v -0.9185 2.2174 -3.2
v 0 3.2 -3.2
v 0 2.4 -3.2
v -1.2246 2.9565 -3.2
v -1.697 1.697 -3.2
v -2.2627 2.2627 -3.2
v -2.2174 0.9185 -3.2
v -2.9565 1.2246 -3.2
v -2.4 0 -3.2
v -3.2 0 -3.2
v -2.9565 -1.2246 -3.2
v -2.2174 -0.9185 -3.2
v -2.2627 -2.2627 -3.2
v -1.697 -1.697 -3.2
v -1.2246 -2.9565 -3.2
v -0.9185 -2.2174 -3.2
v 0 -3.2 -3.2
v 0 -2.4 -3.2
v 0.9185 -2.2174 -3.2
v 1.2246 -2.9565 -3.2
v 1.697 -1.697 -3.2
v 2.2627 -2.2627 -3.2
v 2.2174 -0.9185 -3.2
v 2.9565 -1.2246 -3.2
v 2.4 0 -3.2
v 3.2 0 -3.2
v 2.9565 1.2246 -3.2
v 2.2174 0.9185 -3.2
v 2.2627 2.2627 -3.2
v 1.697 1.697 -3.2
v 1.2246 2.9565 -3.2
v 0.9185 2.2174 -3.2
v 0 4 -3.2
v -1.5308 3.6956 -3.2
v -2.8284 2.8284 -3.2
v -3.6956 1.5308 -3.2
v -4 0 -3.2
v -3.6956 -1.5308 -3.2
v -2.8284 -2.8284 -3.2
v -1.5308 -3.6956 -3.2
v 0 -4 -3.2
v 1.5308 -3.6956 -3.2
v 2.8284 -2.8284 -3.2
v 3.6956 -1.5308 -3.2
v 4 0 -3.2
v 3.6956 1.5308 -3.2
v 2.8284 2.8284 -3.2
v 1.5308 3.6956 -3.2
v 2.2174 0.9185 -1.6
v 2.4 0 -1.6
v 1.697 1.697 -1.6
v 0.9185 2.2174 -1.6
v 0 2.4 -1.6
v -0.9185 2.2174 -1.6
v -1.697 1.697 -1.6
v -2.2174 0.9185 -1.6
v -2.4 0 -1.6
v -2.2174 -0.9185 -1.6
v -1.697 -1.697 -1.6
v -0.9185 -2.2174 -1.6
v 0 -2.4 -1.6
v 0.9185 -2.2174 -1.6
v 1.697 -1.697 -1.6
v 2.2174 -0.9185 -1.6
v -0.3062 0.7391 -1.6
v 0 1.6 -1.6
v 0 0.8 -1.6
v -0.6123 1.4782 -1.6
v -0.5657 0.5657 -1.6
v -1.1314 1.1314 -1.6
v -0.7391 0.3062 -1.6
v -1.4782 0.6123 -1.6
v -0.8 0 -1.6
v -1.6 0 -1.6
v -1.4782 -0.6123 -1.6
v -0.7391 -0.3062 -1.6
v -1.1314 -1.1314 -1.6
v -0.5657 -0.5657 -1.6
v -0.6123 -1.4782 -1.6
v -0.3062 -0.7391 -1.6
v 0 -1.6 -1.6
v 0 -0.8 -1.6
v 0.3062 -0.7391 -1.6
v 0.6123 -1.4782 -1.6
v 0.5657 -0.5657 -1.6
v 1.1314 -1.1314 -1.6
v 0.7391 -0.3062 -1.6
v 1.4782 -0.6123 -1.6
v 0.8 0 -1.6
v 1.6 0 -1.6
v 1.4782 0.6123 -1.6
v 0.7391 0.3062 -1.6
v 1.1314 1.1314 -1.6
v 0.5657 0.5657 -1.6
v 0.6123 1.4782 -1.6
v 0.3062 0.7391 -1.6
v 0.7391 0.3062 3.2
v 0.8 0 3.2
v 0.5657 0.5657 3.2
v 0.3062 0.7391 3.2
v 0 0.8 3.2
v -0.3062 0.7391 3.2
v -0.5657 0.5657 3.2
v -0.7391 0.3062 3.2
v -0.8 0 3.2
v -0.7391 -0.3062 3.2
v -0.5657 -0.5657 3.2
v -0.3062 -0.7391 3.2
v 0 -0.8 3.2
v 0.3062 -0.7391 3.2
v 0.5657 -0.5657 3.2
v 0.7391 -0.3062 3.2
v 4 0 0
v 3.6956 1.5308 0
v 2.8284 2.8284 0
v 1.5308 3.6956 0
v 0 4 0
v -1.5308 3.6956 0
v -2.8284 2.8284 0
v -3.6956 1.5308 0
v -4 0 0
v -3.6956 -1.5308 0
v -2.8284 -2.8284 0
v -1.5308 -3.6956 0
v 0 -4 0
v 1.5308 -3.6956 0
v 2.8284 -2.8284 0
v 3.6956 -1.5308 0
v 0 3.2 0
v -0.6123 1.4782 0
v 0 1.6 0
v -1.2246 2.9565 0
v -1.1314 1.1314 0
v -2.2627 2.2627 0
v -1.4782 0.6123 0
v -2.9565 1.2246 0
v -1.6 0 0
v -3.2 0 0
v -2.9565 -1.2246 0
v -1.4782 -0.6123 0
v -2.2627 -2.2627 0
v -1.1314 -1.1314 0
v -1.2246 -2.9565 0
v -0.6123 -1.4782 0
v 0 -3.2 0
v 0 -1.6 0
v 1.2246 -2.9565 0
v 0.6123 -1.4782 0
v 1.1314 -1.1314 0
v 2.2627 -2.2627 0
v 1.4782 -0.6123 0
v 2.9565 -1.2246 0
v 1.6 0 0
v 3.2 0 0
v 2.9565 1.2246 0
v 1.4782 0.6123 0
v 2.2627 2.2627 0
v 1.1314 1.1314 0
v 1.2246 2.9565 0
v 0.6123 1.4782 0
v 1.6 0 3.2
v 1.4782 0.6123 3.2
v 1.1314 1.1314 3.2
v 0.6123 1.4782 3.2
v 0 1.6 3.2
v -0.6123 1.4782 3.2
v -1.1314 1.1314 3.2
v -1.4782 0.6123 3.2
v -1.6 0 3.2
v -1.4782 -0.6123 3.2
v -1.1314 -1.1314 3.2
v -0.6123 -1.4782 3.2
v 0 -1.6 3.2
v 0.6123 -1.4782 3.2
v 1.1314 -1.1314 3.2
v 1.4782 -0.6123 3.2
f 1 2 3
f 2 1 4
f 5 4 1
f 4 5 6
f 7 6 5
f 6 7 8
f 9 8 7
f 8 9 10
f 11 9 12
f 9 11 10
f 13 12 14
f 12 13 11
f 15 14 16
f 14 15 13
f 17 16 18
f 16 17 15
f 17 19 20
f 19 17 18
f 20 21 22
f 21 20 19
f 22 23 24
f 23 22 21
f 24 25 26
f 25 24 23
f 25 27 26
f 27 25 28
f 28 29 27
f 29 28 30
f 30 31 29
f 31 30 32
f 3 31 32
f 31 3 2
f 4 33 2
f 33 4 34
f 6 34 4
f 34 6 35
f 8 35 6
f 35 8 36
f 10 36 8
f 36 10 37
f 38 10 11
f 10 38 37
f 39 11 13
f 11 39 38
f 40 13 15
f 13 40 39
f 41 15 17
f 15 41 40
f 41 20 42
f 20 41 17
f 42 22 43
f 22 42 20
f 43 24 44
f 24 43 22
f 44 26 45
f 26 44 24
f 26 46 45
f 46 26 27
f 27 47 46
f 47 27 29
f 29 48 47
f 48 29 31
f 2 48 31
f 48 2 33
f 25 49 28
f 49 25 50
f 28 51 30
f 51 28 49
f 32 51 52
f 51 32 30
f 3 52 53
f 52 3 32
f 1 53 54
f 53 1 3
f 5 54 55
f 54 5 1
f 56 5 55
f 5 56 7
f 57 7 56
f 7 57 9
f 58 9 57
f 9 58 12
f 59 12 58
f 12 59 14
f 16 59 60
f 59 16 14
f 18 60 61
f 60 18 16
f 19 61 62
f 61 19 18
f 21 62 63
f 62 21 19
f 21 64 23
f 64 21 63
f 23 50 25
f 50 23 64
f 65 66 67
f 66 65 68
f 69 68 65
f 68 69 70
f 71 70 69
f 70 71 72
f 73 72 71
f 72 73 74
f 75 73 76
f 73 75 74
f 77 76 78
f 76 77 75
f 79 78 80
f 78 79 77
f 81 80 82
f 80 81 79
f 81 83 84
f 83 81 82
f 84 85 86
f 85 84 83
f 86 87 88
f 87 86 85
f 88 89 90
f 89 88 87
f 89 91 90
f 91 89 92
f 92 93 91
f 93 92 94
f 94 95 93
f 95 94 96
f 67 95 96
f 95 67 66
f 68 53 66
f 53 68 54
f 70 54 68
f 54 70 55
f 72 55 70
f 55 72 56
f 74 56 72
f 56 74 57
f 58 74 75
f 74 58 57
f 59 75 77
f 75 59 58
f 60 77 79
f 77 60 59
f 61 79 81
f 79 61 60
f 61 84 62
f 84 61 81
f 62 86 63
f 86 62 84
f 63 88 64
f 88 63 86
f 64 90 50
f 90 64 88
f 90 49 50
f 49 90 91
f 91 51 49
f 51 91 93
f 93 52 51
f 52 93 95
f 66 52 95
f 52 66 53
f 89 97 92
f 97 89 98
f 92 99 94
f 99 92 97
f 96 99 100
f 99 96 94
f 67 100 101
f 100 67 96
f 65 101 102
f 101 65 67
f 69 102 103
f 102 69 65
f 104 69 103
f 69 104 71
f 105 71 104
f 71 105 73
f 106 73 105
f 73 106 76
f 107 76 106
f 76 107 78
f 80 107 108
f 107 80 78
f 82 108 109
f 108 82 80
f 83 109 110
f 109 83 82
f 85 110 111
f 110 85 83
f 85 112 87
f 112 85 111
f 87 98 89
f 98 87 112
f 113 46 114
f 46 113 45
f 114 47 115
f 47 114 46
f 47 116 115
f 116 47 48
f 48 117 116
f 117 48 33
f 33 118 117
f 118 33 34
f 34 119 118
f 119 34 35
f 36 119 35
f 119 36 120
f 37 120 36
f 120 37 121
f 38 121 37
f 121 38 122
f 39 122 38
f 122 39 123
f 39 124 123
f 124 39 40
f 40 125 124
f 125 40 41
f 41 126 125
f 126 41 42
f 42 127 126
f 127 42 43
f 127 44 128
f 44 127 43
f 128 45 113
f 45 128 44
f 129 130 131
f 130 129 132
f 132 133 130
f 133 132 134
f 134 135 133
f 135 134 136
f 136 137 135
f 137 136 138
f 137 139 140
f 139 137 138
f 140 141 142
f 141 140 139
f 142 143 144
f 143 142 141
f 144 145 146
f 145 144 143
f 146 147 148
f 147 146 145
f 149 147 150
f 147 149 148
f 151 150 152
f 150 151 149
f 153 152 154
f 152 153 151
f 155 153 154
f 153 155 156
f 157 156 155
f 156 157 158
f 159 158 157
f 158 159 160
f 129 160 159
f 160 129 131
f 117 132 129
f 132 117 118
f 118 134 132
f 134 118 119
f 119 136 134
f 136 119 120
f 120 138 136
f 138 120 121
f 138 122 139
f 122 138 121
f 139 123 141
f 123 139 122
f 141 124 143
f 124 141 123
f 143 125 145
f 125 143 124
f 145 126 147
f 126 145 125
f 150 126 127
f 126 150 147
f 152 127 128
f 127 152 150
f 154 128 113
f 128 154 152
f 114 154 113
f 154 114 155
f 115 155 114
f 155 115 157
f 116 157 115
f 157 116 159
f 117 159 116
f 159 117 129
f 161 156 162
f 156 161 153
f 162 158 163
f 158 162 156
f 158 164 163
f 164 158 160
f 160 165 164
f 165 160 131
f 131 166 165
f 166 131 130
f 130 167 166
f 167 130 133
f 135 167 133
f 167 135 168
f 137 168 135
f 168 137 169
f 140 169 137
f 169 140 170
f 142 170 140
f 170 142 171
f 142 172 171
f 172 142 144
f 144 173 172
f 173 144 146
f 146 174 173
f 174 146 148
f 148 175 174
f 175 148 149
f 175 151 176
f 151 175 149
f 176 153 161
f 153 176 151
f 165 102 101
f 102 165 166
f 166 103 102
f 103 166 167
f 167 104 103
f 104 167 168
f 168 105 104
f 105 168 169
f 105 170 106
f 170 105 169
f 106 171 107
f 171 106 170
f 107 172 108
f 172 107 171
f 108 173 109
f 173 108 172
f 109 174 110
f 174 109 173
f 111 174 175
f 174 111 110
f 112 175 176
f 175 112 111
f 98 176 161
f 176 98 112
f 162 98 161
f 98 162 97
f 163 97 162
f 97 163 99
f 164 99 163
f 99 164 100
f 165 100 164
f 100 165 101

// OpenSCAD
// file: ../p/4-4edge.scad
use <../lib.scad>
function ldraw_lib__4_4edge() = [
// 0 Circle 1.0
// 0 Name: 4-4edge.dat
// 0 Author: James Jessiman
// 0 !LDRAW_ORG Primitive UPDATE 2017-01
// 0 !LICENSE Licensed under CC BY 4.0 : see CAreadme.txt
// 
// 0 BFC CERTIFY CCW
  [0,"BFC","CERTIFY"],
  [0,"BFC","CCW"],
// 
// 0 !HISTORY 1998-12-15 [PTadmin] Official Update 1998-10
// 0 !HISTORY 2005-12-28 [PTadmin] Official Update 2005-01
// 0 !HISTORY 2007-06-24 [PTadmin] Header formatted for Contributor Agreement
// 0 !HISTORY 2008-07-01 [PTadmin] Official Update 2008-01
// 0 !HISTORY 2017-01-15 [Steffen] BFCed
// 0 !HISTORY 2017-12-30 [PTadmin] Official Update 2017-01
// 
// 
// 2 24 1 0 0 0.9239 0 0.3827
  [2,24,1,0,0,0.9239,0,0.3827],
// 2 24 0.9239 0 0.3827 0.7071 0 0.7071
  [2,24,0.9239,0,0.3827,0.7071,0,0.7071],
// 2 24 0.7071 0 0.7071 0.3827 0 0.9239
  [2,24,0.7071,0,0.7071,0.3827,0,0.9239],
// 2 24 0.3827 0 0.9239 0 0 1
  [2,24,0.3827,0,0.9239,0,0,1],
// 2 24 0 0 1 -0.3827 0 0.9239
  [2,24,0,0,1,-0.3827,0,0.9239],
// 2 24 -0.3827 0 0.9239 -0.7071 0 0.7071
  [2,24,-0.3827,0,0.9239,-0.7071,0,0.7071],
// 2 24 -0.7071 0 0.7071 -0.9239 0 0.3827
  [2,24,-0.7071,0,0.7071,-0.9239,0,0.3827],
// 2 24 -0.9239 0 0.3827 -1 0 -0
  [2,24,-0.9239,0,0.3827,-1,0,-0],
// 2 24 -1 0 -0 -0.9239 0 -0.3827
  [2,24,-1,0,-0,-0.9239,0,-0.3827],
// 2 24 -0.9239 0 -0.3827 -0.7071 0 -0.7071
  [2,24,-0.9239,0,-0.3827,-0.7071,0,-0.7071],
// 2 24 -0.7071 0 -0.7071 -0.3827 0 -0.9239
  [2,24,-0.7071,0,-0.7071,-0.3827,0,-0.9239],
// 2 24 -0.3827 0 -0.9239 0 0 -1
  [2,24,-0.3827,0,-0.9239,0,0,-1],
// 2 24 0 0 -1 0.3827 0 -0.9239
  [2,24,0,0,-1,0.3827,0,-0.9239],
// 2 24 0.3827 0 -0.9239 0.7071 0 -0.7071
  [2,24,0.3827,0,-0.9239,0.7071,0,-0.7071],
// 2 24 0.7071 0 -0.7071 0.9239 0 -0.3827
  [2,24,0.7071,0,-0.7071,0.9239,0,-0.3827],
// 2 24 0.9239 0 -0.3827 1 0 0
  [2,24,0.9239,0,-0.3827,1,0,0],
];
module ldraw_lib__4_4edge(step=0, col=false, unit=2/5, alt=false, line=0.2, solid=!$preview)
    makepoly(ldraw_lib__4_4edge(), step=step, col=col, unit=unit, alt=alt, line=line, solid=solid);
ldraw_lib__4_4edge(line=0.2);
// file: ../p/4-4cyli.scad
use <../lib.scad>
function ldraw_lib__4_4cyli() = [
// 0 Cylinder 1.0
// 0 Name: 4-4cyli.dat
// 0 Author: James Jessiman
// 0 !LDRAW_ORG Primitive UPDATE 2005-01
// 0 !LICENSE Licensed under CC BY 2.0 and CC BY 4.0 : see CAreadme.txt
// 
// 0 BFC CERTIFY CCW
  [0,"BFC","CERTIFY"],
  [0,"BFC","CCW"],
// 
// 0 !HISTORY 1998-12-15 [PTadmin] Official Update 1998-10
// 0 !HISTORY 2002-03-23 [sbliss] Added BFC statement; merged headers from files in distributions LDraw 0.27 and Complete.
// 0 !HISTORY 2002-04-25 [PTadmin] Official Update 2002-02
// 0 !HISTORY 2004-12-14 [guyvivan] BFC CCW
// 0 !HISTORY 2005-12-28 [PTadmin] Official Update 2005-01
// 0 !HISTORY 2007-06-24 [PTadmin] Header formatted for Contributor Agreement
// 0 !HISTORY 2008-07-01 [PTadmin] Official Update 2008-01
// 
// 
// 4 16 1 1 0 0.9239 1 0.3827 0.9239 0 0.3827 1 0 0
  [4,16,1,1,0,0.9239,1,0.3827,0.9239,0,0.3827,1,0,0],
// 5 24 1 0 0 1 1 0 0.9239 0 0.3827 0.9239 0 -0.3827
  [5,24,1,0,0,1,1,0,0.9239,0,0.3827,0.9239,0,-0.3827],
// 4 16 0.9239 1 0.3827 0.7071 1 0.7071 0.7071 0 0.7071 0.9239 0 0.3827
  [4,16,0.9239,1,0.3827,0.7071,1,0.7071,0.7071,0,0.7071,0.9239,0,0.3827],
// 5 24 0.9239 0 0.3827 0.9239 1 0.3827 0.7071 0 0.7071 1 0 0
  [5,24,0.9239,0,0.3827,0.9239,1,0.3827,0.7071,0,0.7071,1,0,0],
// 4 16 0.7071 1 0.7071 0.3827 1 0.9239 0.3827 0 0.9239 0.7071 0 0.7071
  [4,16,0.7071,1,0.7071,0.3827,1,0.9239,0.3827,0,0.9239,0.7071,0,0.7071],
// 5 24 0.7071 0 0.7071 0.7071 1 0.7071 0.3827 0 0.9239 0.9239 0 0.3827
  [5,24,0.7071,0,0.7071,0.7071,1,0.7071,0.3827,0,0.9239,0.9239,0,0.3827],
// 4 16 0.3827 1 0.9239 0 1 1 0 0 1 0.3827 0 0.9239
  [4,16,0.3827,1,0.9239,0,1,1,0,0,1,0.3827,0,0.9239],
// 5 24 0.3827 0 0.9239 0.3827 1 0.9239 0 0 1 0.7071 0 0.7071
  [5,24,0.3827,0,0.9239,0.3827,1,0.9239,0,0,1,0.7071,0,0.7071],
// 4 16 0 1 1 -0.3827 1 0.9239 -0.3827 0 0.9239 0 0 1
  [4,16,0,1,1,-0.3827,1,0.9239,-0.3827,0,0.9239,0,0,1],
// 5 24 0 0 1 0 1 1 -0.3827 0 0.9239 0.3827 0 0.9239
  [5,24,0,0,1,0,1,1,-0.3827,0,0.9239,0.3827,0,0.9239],
// 4 16 -0.3827 1 0.9239 -0.7071 1 0.7071 -0.7071 0 0.7071 -0.3827 0 0.9239
  [4,16,-0.3827,1,0.9239,-0.7071,1,0.7071,-0.7071,0,0.7071,-0.3827,0,0.9239],
// 5 24 -0.3827 0 0.9239 -0.3827 1 0.9239 -0.7071 0 0.7071 0 0 1
  [5,24,-0.3827,0,0.9239,-0.3827,1,0.9239,-0.7071,0,0.7071,0,0,1],
// 4 16 -0.7071 1 0.7071 -0.9239 1 0.3827 -0.9239 0 0.3827 -0.7071 0 0.7071
  [4,16,-0.7071,1,0.7071,-0.9239,1,0.3827,-0.9239,0,0.3827,-0.7071,0,0.7071],
// 5 24 -0.7071 0 0.7071 -0.7071 1 0.7071 -0.9239 0 0.3827 -0.3827 0 0.9239
  [5,24,-0.7071,0,0.7071,-0.7071,1,0.7071,-0.9239,0,0.3827,-0.3827,0,0.9239],
// 4 16 -0.9239 1 0.3827 -1 1 0 -1 0 0 -0.9239 0 0.3827
  [4,16,-0.9239,1,0.3827,-1,1,0,-1,0,0,-0.9239,0,0.3827],
// 5 24 -0.9239 0 0.3827 -0.9239 1 0.3827 -1 0 0 -0.7071 0 0.7071
  [5,24,-0.9239,0,0.3827,-0.9239,1,0.3827,-1,0,0,-0.7071,0,0.7071],
// 4 16 -1 1 0 -0.9239 1 -0.3827 -0.9239 0 -0.3827 -1 0 0
  [4,16,-1,1,0,-0.9239,1,-0.3827,-0.9239,0,-0.3827,-1,0,0],
// 5 24 -1 0 0 -1 1 0 -0.9239 0 -0.3827 -0.9239 0 0.3827
  [5,24,-1,0,0,-1,1,0,-0.9239,0,-0.3827,-0.9239,0,0.3827],
// 4 16 -0.9239 1 -0.3827 -0.7071 1 -0.7071 -0.7071 0 -0.7071 -0.9239 0 -0.3827
  [4,16,-0.9239,1,-0.3827,-0.7071,1,-0.7071,-0.7071,0,-0.7071,-0.9239,0,-0.3827],
// 5 24 -0.9239 0 -0.3827 -0.9239 1 -0.3827 -0.7071 0 -0.7071 -1 0 0
  [5,24,-0.9239,0,-0.3827,-0.9239,1,-0.3827,-0.7071,0,-0.7071,-1,0,0],
// 4 16 -0.7071 1 -0.7071 -0.3827 1 -0.9239 -0.3827 0 -0.9239 -0.7071 0 -0.7071
  [4,16,-0.7071,1,-0.7071,-0.3827,1,-0.9239,-0.3827,0,-0.9239,-0.7071,0,-0.7071],
// 5 24 -0.7071 0 -0.7071 -0.7071 1 -0.7071 -0.3827 0 -0.9239 -0.9239 0 -0.3827
  [5,24,-0.7071,0,-0.7071,-0.7071,1,-0.7071,-0.3827,0,-0.9239,-0.9239,0,-0.3827],
// 4 16 -0.3827 1 -0.9239 0 1 -1 0 0 -1 -0.3827 0 -0.9239
  [4,16,-0.3827,1,-0.9239,0,1,-1,0,0,-1,-0.3827,0,-0.9239],
// 5 24 -0.3827 0 -0.9239 -0.3827 1 -0.9239 0 0 -1 -0.7071 0 -0.7071
  [5,24,-0.3827,0,-0.9239,-0.3827,1,-0.9239,0,0,-1,-0.7071,0,-0.7071],
// 4 16 0 1 -1 0.3827 1 -0.9239 0.3827 0 -0.9239 0 0 -1
  [4,16,0,1,-1,0.3827,1,-0.9239,0.3827,0,-0.9239,0,0,-1],
// 5 24 0 0 -1 0 1 -1 0.3827 0 -0.9239 -0.3827 0 -0.9239
  [5,24,0,0,-1,0,1,-1,0.3827,0,-0.9239,-0.3827,0,-0.9239],
// 4 16 0.3827 1 -0.9239 0.7071 1 -0.7071 0.7071 0 -0.7071 0.3827 0 -0.9239
  [4,16,0.3827,1,-0.9239,0.7071,1,-0.7071,0.7071,0,-0.7071,0.3827,0,-0.9239],
// 5 24 0.3827 0 -0.9239 0.3827 1 -0.9239 0.7071 0 -0.7071 0 0 -1
  [5,24,0.3827,0,-0.9239,0.3827,1,-0.9239,0.7071,0,-0.7071,0,0,-1],
// 4 16 0.7071 1 -0.7071 0.9239 1 -0.3827 0.9239 0 -0.3827 0.7071 0 -0.7071
  [4,16,0.7071,1,-0.7071,0.9239,1,-0.3827,0.9239,0,-0.3827,0.7071,0,-0.7071],
// 5 24 0.7071 0 -0.7071 0.7071 1 -0.7071 0.9239 0 -0.3827 0.3827 0 -0.9239
  [5,24,0.7071,0,-0.7071,0.7071,1,-0.7071,0.9239,0,-0.3827,0.3827,0,-0.9239],
// 4 16 0.9239 1 -0.3827 1 1 0 1 0 0 0.9239 0 -0.3827
  [4,16,0.9239,1,-0.3827,1,1,0,1,0,0,0.9239,0,-0.3827],
// 5 24 0.9239 0 -0.3827 0.9239 1 -0.3827 1 0 0 0.7071 0 -0.7071
  [5,24,0.9239,0,-0.3827,0.9239,1,-0.3827,1,0,0,0.7071,0,-0.7071],
// 0
];
module ldraw_lib__4_4cyli(step=0, col=false, unit=2/5, alt=false, line=0.2, solid=!$preview)
    makepoly(ldraw_lib__4_4cyli(), step=step, col=col, unit=unit, alt=alt, line=line, solid=solid);
ldraw_lib__4_4cyli(line=0.2);
// file: ../p/4-4ring4.scad
use <../lib.scad>
function ldraw_lib__4_4ring4() = [
// 0 Ring  4 x 1.0
// 0 Name: 4-4ring4.dat
// 0 Author: James Jessiman
// 0 !LDRAW_ORG Primitive UPDATE 2009-01
// 0 !LICENSE Licensed under CC BY 2.0 and CC BY 4.0 : see CAreadme.txt
// 
// 0 BFC CERTIFY CCW
  [0,"BFC","CERTIFY"],
  [0,"BFC","CCW"],
// 
// 0 !HISTORY 1998-12-15 [PTadmin] Official Update 1998-10
// 0 !HISTORY 2002-04-08 [BrickCaster] Modified for BFC compliance
// 0 !HISTORY 2002-04-25 [PTadmin] Official Update 2002-02
// 0 !HISTORY 2007-06-24 [PTadmin] Header formatted for Contributor Agreement
// 0 !HISTORY 2008-07-01 [PTadmin] Official Update 2008-01
// 0 !HISTORY 2008-08-26 [cwdee] Switch polygon winding and rename
// 0 !HISTORY 2009-05-02 [PTadmin] Official Update 2009-01
// 
// 
// 4 16 -1.9135 0 4.6195 -1.5308 0 3.6956 0 0 4 0 0 5
  [4,16,-1.9135,0,4.6195,-1.5308,0,3.6956,0,0,4,0,0,5],
// 4 16 -3.5355 0 3.5355 -2.8284 0 2.8284 -1.5308 0 3.6956 -1.9135 0 4.6195
  [4,16,-3.5355,0,3.5355,-2.8284,0,2.8284,-1.5308,0,3.6956,-1.9135,0,4.6195],
// 4 16 -4.6195 0 1.9135 -3.6956 0 1.5308 -2.8284 0 2.8284 -3.5355 0 3.5355
  [4,16,-4.6195,0,1.9135,-3.6956,0,1.5308,-2.8284,0,2.8284,-3.5355,0,3.5355],
// 4 16 -5 0 0 -4 0 0 -3.6956 0 1.5308 -4.6195 0 1.9135
  [4,16,-5,0,0,-4,0,0,-3.6956,0,1.5308,-4.6195,0,1.9135],
// 4 16 -4.6195 0 -1.9135 -3.6956 0 -1.5308 -4 0 0 -5 0 0
  [4,16,-4.6195,0,-1.9135,-3.6956,0,-1.5308,-4,0,0,-5,0,0],
// 4 16 -3.5355 0 -3.5355 -2.8284 0 -2.8284 -3.6956 0 -1.5308 -4.6195 0 -1.9135
  [4,16,-3.5355,0,-3.5355,-2.8284,0,-2.8284,-3.6956,0,-1.5308,-4.6195,0,-1.9135],
// 4 16 -1.9135 0 -4.6195 -1.5308 0 -3.6956 -2.8284 0 -2.8284 -3.5355 0 -3.5355
  [4,16,-1.9135,0,-4.6195,-1.5308,0,-3.6956,-2.8284,0,-2.8284,-3.5355,0,-3.5355],
// 4 16 0 0 -5 0 0 -4 -1.5308 0 -3.6956 -1.9135 0 -4.6195
  [4,16,0,0,-5,0,0,-4,-1.5308,0,-3.6956,-1.9135,0,-4.6195],
// 4 16 1.9135 0 -4.6195 1.5308 0 -3.6956 0 0 -4 0 0 -5
  [4,16,1.9135,0,-4.6195,1.5308,0,-3.6956,0,0,-4,0,0,-5],
// 4 16 3.5355 0 -3.5355 2.8284 0 -2.8284 1.5308 0 -3.6956 1.9135 0 -4.6195
  [4,16,3.5355,0,-3.5355,2.8284,0,-2.8284,1.5308,0,-3.6956,1.9135,0,-4.6195],
// 4 16 4.6195 0 -1.9135 3.6956 0 -1.5308 2.8284 0 -2.8284 3.5355 0 -3.5355
  [4,16,4.6195,0,-1.9135,3.6956,0,-1.5308,2.8284,0,-2.8284,3.5355,0,-3.5355],
// 4 16 5 0 0 4 0 0 3.6956 0 -1.5308 4.6195 0 -1.9135
  [4,16,5,0,0,4,0,0,3.6956,0,-1.5308,4.6195,0,-1.9135],
// 4 16 4.6195 0 1.9135 3.6956 0 1.5308 4 0 0 5 0 0
  [4,16,4.6195,0,1.9135,3.6956,0,1.5308,4,0,0,5,0,0],
// 4 16 3.5355 0 3.5355 2.8284 0 2.8284 3.6956 0 1.5308 4.6195 0 1.9135
  [4,16,3.5355,0,3.5355,2.8284,0,2.8284,3.6956,0,1.5308,4.6195,0,1.9135],
// 4 16 1.9135 0 4.6195 1.5308 0 3.6956 2.8284 0 2.8284 3.5355 0 3.5355
  [4,16,1.9135,0,4.6195,1.5308,0,3.6956,2.8284,0,2.8284,3.5355,0,3.5355],
// 4 16 0 0 5 0 0 4 1.5308 0 3.6956 1.9135 0 4.6195
  [4,16,0,0,5,0,0,4,1.5308,0,3.6956,1.9135,0,4.6195],
// 0
];
module ldraw_lib__4_4ring4(step=0, col=false, unit=2/5, alt=false, line=0.2, solid=!$preview)
    makepoly(ldraw_lib__4_4ring4(), step=step, col=col, unit=unit, alt=alt, line=line, solid=solid);
ldraw_lib__4_4ring4(line=0.2);
// file: ../p/4-4ring3.scad
use <../lib.scad>
function ldraw_lib__4_4ring3() = [
// 0 Ring  3 x 1.0
// 0 Name: 4-4ring3.dat
// 0 Author: James Jessiman
// 0 !LDRAW_ORG Primitive UPDATE 2009-01
// 0 !LICENSE Licensed under CC BY 2.0 and CC BY 4.0 : see CAreadme.txt
// 
// 0 BFC CERTIFY CCW
  [0,"BFC","CERTIFY"],
  [0,"BFC","CCW"],
// 
// 0 !HISTORY 1998-12-15 [PTadmin] Official Update 1998-10
// 0 !HISTORY 2002-04-05 [hafhead] Added BFC statement
// 0 !HISTORY 2002-04-25 [PTadmin] Official Update 2002-02
// 0 !HISTORY 2007-06-24 [PTadmin] Header formatted for Contributor Agreement
// 0 !HISTORY 2008-07-01 [PTadmin] Official Update 2008-01
// 0 !HISTORY 2008-08-26 [cwdee] Switch polygon winding and rename
// 0 !HISTORY 2009-05-02 [PTadmin] Official Update 2009-01
// 
// 
// 4 16 -1.5308 0 3.6956 -1.1481 0 2.7717 0 0 3 0 0 4
  [4,16,-1.5308,0,3.6956,-1.1481,0,2.7717,0,0,3,0,0,4],
// 4 16 -2.8284 0 2.8284 -2.1213 0 2.1213 -1.1481 0 2.7717 -1.5308 0 3.6956
  [4,16,-2.8284,0,2.8284,-2.1213,0,2.1213,-1.1481,0,2.7717,-1.5308,0,3.6956],
// 4 16 -3.6956 0 1.5308 -2.7717 0 1.1481 -2.1213 0 2.1213 -2.8284 0 2.8284
  [4,16,-3.6956,0,1.5308,-2.7717,0,1.1481,-2.1213,0,2.1213,-2.8284,0,2.8284],
// 4 16 -4 0 0 -3 0 0 -2.7717 0 1.1481 -3.6956 0 1.5308
  [4,16,-4,0,0,-3,0,0,-2.7717,0,1.1481,-3.6956,0,1.5308],
// 4 16 -3.6956 0 -1.5308 -2.7717 0 -1.1481 -3 0 0 -4 0 0
  [4,16,-3.6956,0,-1.5308,-2.7717,0,-1.1481,-3,0,0,-4,0,0],
// 4 16 -2.8284 0 -2.8284 -2.1213 0 -2.1213 -2.7717 0 -1.1481 -3.6956 0 -1.5308
  [4,16,-2.8284,0,-2.8284,-2.1213,0,-2.1213,-2.7717,0,-1.1481,-3.6956,0,-1.5308],
// 4 16 -1.5308 0 -3.6956 -1.1481 0 -2.7717 -2.1213 0 -2.1213 -2.8284 0 -2.8284
  [4,16,-1.5308,0,-3.6956,-1.1481,0,-2.7717,-2.1213,0,-2.1213,-2.8284,0,-2.8284],
// 4 16 0 0 -4 0 0 -3 -1.1481 0 -2.7717 -1.5308 0 -3.6956
  [4,16,0,0,-4,0,0,-3,-1.1481,0,-2.7717,-1.5308,0,-3.6956],
// 4 16 1.5308 0 -3.6956 1.1481 0 -2.7717 0 0 -3 0 0 -4
  [4,16,1.5308,0,-3.6956,1.1481,0,-2.7717,0,0,-3,0,0,-4],
// 4 16 2.8284 0 -2.8284 2.1213 0 -2.1213 1.1481 0 -2.7717 1.5308 0 -3.6956
  [4,16,2.8284,0,-2.8284,2.1213,0,-2.1213,1.1481,0,-2.7717,1.5308,0,-3.6956],
// 4 16 3.6956 0 -1.5308 2.7717 0 -1.1481 2.1213 0 -2.1213 2.8284 0 -2.8284
  [4,16,3.6956,0,-1.5308,2.7717,0,-1.1481,2.1213,0,-2.1213,2.8284,0,-2.8284],
// 4 16 4 0 0 3 0 0 2.7717 0 -1.1481 3.6956 0 -1.5308
  [4,16,4,0,0,3,0,0,2.7717,0,-1.1481,3.6956,0,-1.5308],
// 4 16 3.6956 0 1.5308 2.7717 0 1.1481 3 0 0 4 0 0
  [4,16,3.6956,0,1.5308,2.7717,0,1.1481,3,0,0,4,0,0],
// 4 16 2.8284 0 2.8284 2.1213 0 2.1213 2.7717 0 1.1481 3.6956 0 1.5308
  [4,16,2.8284,0,2.8284,2.1213,0,2.1213,2.7717,0,1.1481,3.6956,0,1.5308],
// 4 16 1.5308 0 3.6956 1.1481 0 2.7717 2.1213 0 2.1213 2.8284 0 2.8284
  [4,16,1.5308,0,3.6956,1.1481,0,2.7717,2.1213,0,2.1213,2.8284,0,2.8284],
// 4 16 0 0 4 0 0 3 1.1481 0 2.7717 1.5308 0 3.6956
  [4,16,0,0,4,0,0,3,1.1481,0,2.7717,1.5308,0,3.6956],
// 0
];
module ldraw_lib__4_4ring3(step=0, col=false, unit=2/5, alt=false, line=0.2, solid=!$preview)
    makepoly(ldraw_lib__4_4ring3(), step=step, col=col, unit=unit, alt=alt, line=line, solid=solid);
ldraw_lib__4_4ring3(line=0.2);
// file: ../p/4-4ring2.scad
use <../lib.scad>
function ldraw_lib__4_4ring2() = [
// 0 Ring  2 x 1.0
// 0 Name: 4-4ring2.dat
// 0 Author: James Jessiman
// 0 !LDRAW_ORG Primitive UPDATE 2009-01
// 0 !LICENSE Licensed under CC BY 2.0 and CC BY 4.0 : see CAreadme.txt
// 
// 0 BFC CERTIFY CCW
  [0,"BFC","CERTIFY"],
  [0,"BFC","CCW"],
// 
// 0 !HISTORY 1998-12-15 [PTadmin] Official Update 1998-10
// 0 !HISTORY 2002-04-05 [hafhead] Added BFC statement
// 0 !HISTORY 2002-04-25 [PTadmin] Official Update 2002-02
// 0 !HISTORY 2007-06-24 [PTadmin] Header formatted for Contributor Agreement
// 0 !HISTORY 2008-07-01 [PTadmin] Official Update 2008-01
// 0 !HISTORY 2008-08-26 [cwdee] Switch polygon winding and rename
// 0 !HISTORY 2009-05-02 [PTadmin] Official Update 2009-01
// 
// 
// 4 16 -1.1481 0 2.7717 -0.7654 0 1.8478 0 0 2 0 0 3
  [4,16,-1.1481,0,2.7717,-0.7654,0,1.8478,0,0,2,0,0,3],
// 4 16 -2.1213 0 2.1213 -1.4142 0 1.4142 -0.7654 0 1.8478 -1.1481 0 2.7717
  [4,16,-2.1213,0,2.1213,-1.4142,0,1.4142,-0.7654,0,1.8478,-1.1481,0,2.7717],
// 4 16 -2.7717 0 1.1481 -1.8478 0 0.7654 -1.4142 0 1.4142 -2.1213 0 2.1213
  [4,16,-2.7717,0,1.1481,-1.8478,0,0.7654,-1.4142,0,1.4142,-2.1213,0,2.1213],
// 4 16 -3 0 0 -2 0 0 -1.8478 0 0.7654 -2.7717 0 1.1481
  [4,16,-3,0,0,-2,0,0,-1.8478,0,0.7654,-2.7717,0,1.1481],
// 4 16 -2.7717 0 -1.1481 -1.8478 0 -0.7654 -2 0 0 -3 0 0
  [4,16,-2.7717,0,-1.1481,-1.8478,0,-0.7654,-2,0,0,-3,0,0],
// 4 16 -2.1213 0 -2.1213 -1.4142 0 -1.4142 -1.8478 0 -0.7654 -2.7717 0 -1.1481
  [4,16,-2.1213,0,-2.1213,-1.4142,0,-1.4142,-1.8478,0,-0.7654,-2.7717,0,-1.1481],
// 4 16 -1.1481 0 -2.7717 -0.7654 0 -1.8478 -1.4142 0 -1.4142 -2.1213 0 -2.1213
  [4,16,-1.1481,0,-2.7717,-0.7654,0,-1.8478,-1.4142,0,-1.4142,-2.1213,0,-2.1213],
// 4 16 0 0 -3 0 0 -2 -0.7654 0 -1.8478 -1.1481 0 -2.7717
  [4,16,0,0,-3,0,0,-2,-0.7654,0,-1.8478,-1.1481,0,-2.7717],
// 4 16 1.1481 0 -2.7717 0.7654 0 -1.8478 0 0 -2 0 0 -3
  [4,16,1.1481,0,-2.7717,0.7654,0,-1.8478,0,0,-2,0,0,-3],
// 4 16 2.1213 0 -2.1213 1.4142 0 -1.4142 0.7654 0 -1.8478 1.1481 0 -2.7717
  [4,16,2.1213,0,-2.1213,1.4142,0,-1.4142,0.7654,0,-1.8478,1.1481,0,-2.7717],
// 4 16 2.7717 0 -1.1481 1.8478 0 -0.7654 1.4142 0 -1.4142 2.1213 0 -2.1213
  [4,16,2.7717,0,-1.1481,1.8478,0,-0.7654,1.4142,0,-1.4142,2.1213,0,-2.1213],
// 4 16 3 0 0 2 0 0 1.8478 0 -0.7654 2.7717 0 -1.1481
  [4,16,3,0,0,2,0,0,1.8478,0,-0.7654,2.7717,0,-1.1481],
// 4 16 2.7717 0 1.1481 1.8478 0 0.7654 2 0 0 3 0 0
  [4,16,2.7717,0,1.1481,1.8478,0,0.7654,2,0,0,3,0,0],
// 4 16 2.1213 0 2.1213 1.4142 0 1.4142 1.8478 0 0.7654 2.7717 0 1.1481
  [4,16,2.1213,0,2.1213,1.4142,0,1.4142,1.8478,0,0.7654,2.7717,0,1.1481],
// 4 16 1.1481 0 2.7717 0.7654 0 1.8478 1.4142 0 1.4142 2.1213 0 2.1213
  [4,16,1.1481,0,2.7717,0.7654,0,1.8478,1.4142,0,1.4142,2.1213,0,2.1213],
// 4 16 0 0 3 0 0 2 0.7654 0 1.8478 1.1481 0 2.7717
  [4,16,0,0,3,0,0,2,0.7654,0,1.8478,1.1481,0,2.7717],
// 0
];
module ldraw_lib__4_4ring2(step=0, col=false, unit=2/5, alt=false, line=0.2, solid=!$preview)
    makepoly(ldraw_lib__4_4ring2(), step=step, col=col, unit=unit, alt=alt, line=line, solid=solid);
ldraw_lib__4_4ring2(line=0.2);
// file: ../p/4-4ring1.scad
use <../lib.scad>
function ldraw_lib__4_4ring1() = [
// 0 Ring  1 x 1.0
// 0 Name: 4-4ring1.dat
// 0 Author: James Jessiman
// 0 !LDRAW_ORG Primitive UPDATE 2009-01
// 0 !LICENSE Licensed under CC BY 2.0 and CC BY 4.0 : see CAreadme.txt
// 
// 0 BFC CERTIFY CCW
  [0,"BFC","CERTIFY"],
  [0,"BFC","CCW"],
// 
// 0 !HISTORY 1998-12-15 [PTadmin] Official Update 1998-10
// 0 !HISTORY 2002-04-08 [BrickCaster] Modified for BFC compliance
// 0 !HISTORY 2002-04-25 [PTadmin] Official Update 2002-02
// 0 !HISTORY 2007-06-24 [PTadmin] Header formatted for Contributor Agreement
// 0 !HISTORY 2008-07-01 [PTadmin] Official Update 2008-01
// 0 !HISTORY 2008-08-26 [cwdee] Switch polygon winding and rename
// 0 !HISTORY 2009-05-02 [PTadmin] Official Update 2009-01
// 
// 
// 4 16 -0.7654 0 1.8478 -0.3827 0 0.9239 0 0 1 0 0 2
  [4,16,-0.7654,0,1.8478,-0.3827,0,0.9239,0,0,1,0,0,2],
// 4 16 -1.4142 0 1.4142 -0.7071 0 0.7071 -0.3827 0 0.9239 -0.7654 0 1.8478
  [4,16,-1.4142,0,1.4142,-0.7071,0,0.7071,-0.3827,0,0.9239,-0.7654,0,1.8478],
// 4 16 -1.8478 0 0.7654 -0.9239 0 0.3827 -0.7071 0 0.7071 -1.4142 0 1.41420
  [4,16,-1.8478,0,0.7654,-0.9239,0,0.3827,-0.7071,0,0.7071,-1.4142,0,1.41420],
// 4 16 -2 0 0 -1 0 0 -0.9239 0 0.3827 -1.8478 0 0.7654
  [4,16,-2,0,0,-1,0,0,-0.9239,0,0.3827,-1.8478,0,0.7654],
// 4 16 -1.8478 0 -0.7654 -0.9239 0 -0.3827 -1 0 0 -2 0 0
  [4,16,-1.8478,0,-0.7654,-0.9239,0,-0.3827,-1,0,0,-2,0,0],
// 4 16 -1.4142 0 -1.4142 -0.7071 0 -0.7071 -0.9239 0 -0.3827 -1.8478 0 -0.7654
  [4,16,-1.4142,0,-1.4142,-0.7071,0,-0.7071,-0.9239,0,-0.3827,-1.8478,0,-0.7654],
// 4 16 -0.7654 0 -1.8478 -0.3827 0 -0.9239 -0.7071 0 -0.7071 -1.4142 0 -1.4142
  [4,16,-0.7654,0,-1.8478,-0.3827,0,-0.9239,-0.7071,0,-0.7071,-1.4142,0,-1.4142],
// 4 16 0 0 -2 0 0 -1 -0.3827 0 -0.9239 -0.7654 0 -1.8478
  [4,16,0,0,-2,0,0,-1,-0.3827,0,-0.9239,-0.7654,0,-1.8478],
// 4 16 0.7654 0 -1.8478 0.3827 0 -0.9239 0 0 -1 0 0 -2
  [4,16,0.7654,0,-1.8478,0.3827,0,-0.9239,0,0,-1,0,0,-2],
// 4 16 1.4142 0 -1.4142 0.7071 0 -0.7071 0.3827 0 -0.9239 0.7654 0 -1.8478
  [4,16,1.4142,0,-1.4142,0.7071,0,-0.7071,0.3827,0,-0.9239,0.7654,0,-1.8478],
// 4 16 1.8478 0 -0.7654 0.9239 0 -0.3827 0.7071 0 -0.7071 1.4142 0 -1.4142
  [4,16,1.8478,0,-0.7654,0.9239,0,-0.3827,0.7071,0,-0.7071,1.4142,0,-1.4142],
// 4 16 2 0 0 1 0 0 0.9239 0 -0.3827 1.8478 0 -0.7654
  [4,16,2,0,0,1,0,0,0.9239,0,-0.3827,1.8478,0,-0.7654],
// 4 16 1.8478 0 0.7654 0.9239 0 0.3827 1 0 0 2 0 0
  [4,16,1.8478,0,0.7654,0.9239,0,0.3827,1,0,0,2,0,0],
// 4 16 1.4142 0 1.4142 0.7071 0 0.7071 0.9239 0 0.3827 1.8478 0 0.7654
  [4,16,1.4142,0,1.4142,0.7071,0,0.7071,0.9239,0,0.3827,1.8478,0,0.7654],
// 4 16 0.7654 0 1.8478 0.3827 0 0.9239 0.7071 0 0.7071 1.4142 0 1.4142
  [4,16,0.7654,0,1.8478,0.3827,0,0.9239,0.7071,0,0.7071,1.4142,0,1.4142],
// 4 16 0 0 2 0 0 1 0.3827 0 0.9239 0.7654 0 1.8478
  [4,16,0,0,2,0,0,1,0.3827,0,0.9239,0.7654,0,1.8478],
// 0
];
module ldraw_lib__4_4ring1(step=0, col=false, unit=2/5, alt=false, line=0.2, solid=!$preview)
    makepoly(ldraw_lib__4_4ring1(), step=step, col=col, unit=unit, alt=alt, line=line, solid=solid);
ldraw_lib__4_4ring1(line=0.2);
// file: ../p/4-4cylo.scad
use <../lib.scad>
use <4-4cyli.scad>
use <4-4edge.scad>
function ldraw_lib__4_4cylo() = [
// 0 Cylinder Open 1.0
// 0 Name: 4-4cylo.dat
// 0 Author: Mark Kennedy [mkennedy]
// 0 !LDRAW_ORG Primitive UPDATE 2010-01
// 0 !LICENSE Licensed under CC BY 4.0 : see CAreadme.txt
// 
// 0 BFC CERTIFY CCW
  [0,"BFC","CERTIFY"],
  [0,"BFC","CCW"],
// 
// 0 !HISTORY 2010-04-05 [PTadmin] Official Update 2010-01
// 
// 
// 1 16 0 0 0 1 0 0 0 1 0 0 0 1 4-4edge.dat
  [1,16,0,0,0,1,0,0,0,1,0,0,0,1, ldraw_lib__4_4edge()],
// 1 16 0 1 0 1 0 0 0 1 0 0 0 1 4-4edge.dat
  [1,16,0,1,0,1,0,0,0,1,0,0,0,1, ldraw_lib__4_4edge()],
// 1 16 0 0 0 1 0 0 0 1 0 0 0 1 4-4cyli.dat
  [1,16,0,0,0,1,0,0,0,1,0,0,0,1, ldraw_lib__4_4cyli()],
// 0
];
module ldraw_lib__4_4cylo(step=0, col=false, unit=2/5, alt=false, line=0.2, solid=!$preview)
    makepoly(ldraw_lib__4_4cylo(), step=step, col=col, unit=unit, alt=alt, line=line, solid=solid);
ldraw_lib__4_4cylo(line=0.2);
// file: 20482.scad
use <../lib.scad>
use <../p/4-4cylo.scad>
use <../p/4-4ring1.scad>
use <../p/4-4ring2.scad>
use <../p/4-4ring3.scad>
use <../p/4-4ring4.scad>
function ldraw_lib__20482() = [
// 0 Tile  1 x  1 Round with Pin and Pin Hole
// 0 Name: 20482.dat
// 0 Author: Gerald Lasser [GeraldLasser]
// 0 !LDRAW_ORG Part UPDATE 2015-01
// 0 !LICENSE Licensed under CC BY 4.0 : see CAreadme.txt
// 
// 0 !HELP Holder for 2 LDU wide Stalks
// 
// 0 BFC CERTIFY CCW
  [0,"BFC","CERTIFY"],
  [0,"BFC","CCW"],
// 
// 0 !KEYWORDS Friends
// 
// 0 !HISTORY 2015-10-11 [PTadmin] Official Update 2015-01
// 
// 
// 1 16 0 8 0 2 0 0 0 -1 0 0 0 2 4-4ring3.dat
  [1,16,0,8,0,2,0,0,0,-1,0,0,0,2, ldraw_lib__4_4ring3()],
// 1 16 0 8 0 2 0 0 0 -1 0 0 0 2 4-4ring4.dat
  [1,16,0,8,0,2,0,0,0,-1,0,0,0,2, ldraw_lib__4_4ring4()],
// 0 BFC INVERTNEXT
  [0,"BFC","INVERTNEXT"],
// 1 16 0 4 0 6 0 0 0 4 0 0 0 6 4-4cylo.dat
  [1,16,0,4,0,6,0,0,0,4,0,0,0,6, ldraw_lib__4_4cylo()],
// 1 16 0 4 0 2 0 0 0 -1 0 0 0 2 4-4ring1.dat
  [1,16,0,4,0,2,0,0,0,-1,0,0,0,2, ldraw_lib__4_4ring1()],
// 1 16 0 4 0 2 0 0 0 -1 0 0 0 2 4-4ring2.dat
  [1,16,0,4,0,2,0,0,0,-1,0,0,0,2, ldraw_lib__4_4ring2()],
// 0 BFC INVERTNEXT
  [0,"BFC","INVERTNEXT"],
// 1 16 0 -8 0 2 0 0 0 12 0 0 0 2 4-4cylo.dat
  [1,16,0,-8,0,2,0,0,0,12,0,0,0,2, ldraw_lib__4_4cylo()],
// 1 16 0 0 0 10 0 0 0 8 0 0 0 10 4-4cylo.dat
  [1,16,0,0,0,10,0,0,0,8,0,0,0,10, ldraw_lib__4_4cylo()],
// 1 16 0 0 0 4 0 0 0 1 0 0 0 4 4-4ring1.dat
  [1,16,0,0,0,4,0,0,0,1,0,0,0,4, ldraw_lib__4_4ring1()],
// 1 16 0 0 0 2 0 0 0 1 0 0 0 2 4-4ring4.dat
  [1,16,0,0,0,2,0,0,0,1,0,0,0,2, ldraw_lib__4_4ring4()],
// 1 16 0 -8 0 4 0 0 0 8 0 0 0 4 4-4cylo.dat
  [1,16,0,-8,0,4,0,0,0,8,0,0,0,4, ldraw_lib__4_4cylo()],
// 1 16 0 -8 0 2 0 0 0 1 0 0 0 2 4-4ring1.dat
  [1,16,0,-8,0,2,0,0,0,1,0,0,0,2, ldraw_lib__4_4ring1()],
];
module ldraw_lib__20482(step=0, col=false, unit=2/5, alt=false, line=0.2, solid=!$preview)
    makepoly(ldraw_lib__20482(), step=step, col=col, unit=unit, alt=alt, line=line, solid=solid);
ldraw_lib__20482(line=0.2);
// main file
use <../lib.scad>
use <20482.scad>
function ldraw_lib__31570() = [
// 0 =Tile  1 x  1 Round with Pin and Pin Hole
// 0 Name: 31570.dat
// 0 Author: Magnus Forsberg [MagFors]
// 0 !LDRAW_ORG Part Alias UPDATE 2020-01
// 0 !LICENSE Licensed under CC BY 4.0 : see CAreadme.txt
// 
// 0 BFC CERTIFY CCW
  [0,"BFC","CERTIFY"],
  [0,"BFC","CCW"],
// 
// 0 !HISTORY 2020-06-28 [PTadmin] Official Update 2020-01
// 
// 
// 0 // This is the transparent counterpart
// 1 16 0 0 0 1 0 0 0 1 0 0 0 1 20482.dat
  [1,16,0,0,0,1,0,0,0,1,0,0,0,1, ldraw_lib__20482()],
];
module ldraw_lib__31570(step=0, col=false, unit=2/5, alt=false, line=0.2, solid=!$preview)
    makepoly(ldraw_lib__31570(), step=step, col=col, unit=unit, alt=alt, line=line, solid=solid);
ldraw_lib__31570(line=0.2);
